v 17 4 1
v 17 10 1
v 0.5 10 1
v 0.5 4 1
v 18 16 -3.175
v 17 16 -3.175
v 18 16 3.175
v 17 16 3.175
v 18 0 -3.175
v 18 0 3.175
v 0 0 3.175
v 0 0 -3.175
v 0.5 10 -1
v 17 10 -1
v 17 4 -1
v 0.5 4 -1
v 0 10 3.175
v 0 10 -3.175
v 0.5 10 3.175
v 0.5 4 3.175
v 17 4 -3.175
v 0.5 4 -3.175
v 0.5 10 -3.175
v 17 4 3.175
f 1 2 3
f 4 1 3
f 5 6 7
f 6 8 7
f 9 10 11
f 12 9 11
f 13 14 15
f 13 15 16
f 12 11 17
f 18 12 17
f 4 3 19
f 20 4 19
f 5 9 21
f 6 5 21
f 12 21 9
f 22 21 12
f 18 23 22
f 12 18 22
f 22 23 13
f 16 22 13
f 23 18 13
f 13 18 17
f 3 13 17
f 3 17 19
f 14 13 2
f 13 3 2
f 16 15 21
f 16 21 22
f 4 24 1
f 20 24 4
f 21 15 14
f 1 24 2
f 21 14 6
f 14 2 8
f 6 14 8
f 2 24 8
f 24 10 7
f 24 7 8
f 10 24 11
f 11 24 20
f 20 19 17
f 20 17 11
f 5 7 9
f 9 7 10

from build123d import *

# Parameters (mm, degrees)
PAD_DEPTH     = 3.175
SKETCH001_W   = 16.5
SKETCH001_H   = 2.94443
SKETCH001_H_2 = 6.219495
POCKET_DEPTH  = 6


with BuildPart() as part:
    # Sketch → Pad (new body, symmetric)
    with BuildSketch(Plane.XY):
        Polygon((0, 0), (0, 10), (17, 10), (17, 16), (18, 16), (18, 0), align=None)
    extrude(amount=PAD_DEPTH, both=True)

    # Sketch001 (on Face2 of Pad) → Pocket (cut)
    with BuildSketch(Plane(origin=(0, 10, 0), x_dir=(-1, 0, 0), z_dir=(0, 1, 0))):
        with Locations((-8.75, 2.472215)):
            Rectangle(SKETCH001_W, SKETCH001_H)
        with Locations((-8.75, -4.109747)):
            Rectangle(SKETCH001_W, SKETCH001_H_2)
    extrude(amount=-POCKET_DEPTH, mode=Mode.SUBTRACT)


solid = part.part
